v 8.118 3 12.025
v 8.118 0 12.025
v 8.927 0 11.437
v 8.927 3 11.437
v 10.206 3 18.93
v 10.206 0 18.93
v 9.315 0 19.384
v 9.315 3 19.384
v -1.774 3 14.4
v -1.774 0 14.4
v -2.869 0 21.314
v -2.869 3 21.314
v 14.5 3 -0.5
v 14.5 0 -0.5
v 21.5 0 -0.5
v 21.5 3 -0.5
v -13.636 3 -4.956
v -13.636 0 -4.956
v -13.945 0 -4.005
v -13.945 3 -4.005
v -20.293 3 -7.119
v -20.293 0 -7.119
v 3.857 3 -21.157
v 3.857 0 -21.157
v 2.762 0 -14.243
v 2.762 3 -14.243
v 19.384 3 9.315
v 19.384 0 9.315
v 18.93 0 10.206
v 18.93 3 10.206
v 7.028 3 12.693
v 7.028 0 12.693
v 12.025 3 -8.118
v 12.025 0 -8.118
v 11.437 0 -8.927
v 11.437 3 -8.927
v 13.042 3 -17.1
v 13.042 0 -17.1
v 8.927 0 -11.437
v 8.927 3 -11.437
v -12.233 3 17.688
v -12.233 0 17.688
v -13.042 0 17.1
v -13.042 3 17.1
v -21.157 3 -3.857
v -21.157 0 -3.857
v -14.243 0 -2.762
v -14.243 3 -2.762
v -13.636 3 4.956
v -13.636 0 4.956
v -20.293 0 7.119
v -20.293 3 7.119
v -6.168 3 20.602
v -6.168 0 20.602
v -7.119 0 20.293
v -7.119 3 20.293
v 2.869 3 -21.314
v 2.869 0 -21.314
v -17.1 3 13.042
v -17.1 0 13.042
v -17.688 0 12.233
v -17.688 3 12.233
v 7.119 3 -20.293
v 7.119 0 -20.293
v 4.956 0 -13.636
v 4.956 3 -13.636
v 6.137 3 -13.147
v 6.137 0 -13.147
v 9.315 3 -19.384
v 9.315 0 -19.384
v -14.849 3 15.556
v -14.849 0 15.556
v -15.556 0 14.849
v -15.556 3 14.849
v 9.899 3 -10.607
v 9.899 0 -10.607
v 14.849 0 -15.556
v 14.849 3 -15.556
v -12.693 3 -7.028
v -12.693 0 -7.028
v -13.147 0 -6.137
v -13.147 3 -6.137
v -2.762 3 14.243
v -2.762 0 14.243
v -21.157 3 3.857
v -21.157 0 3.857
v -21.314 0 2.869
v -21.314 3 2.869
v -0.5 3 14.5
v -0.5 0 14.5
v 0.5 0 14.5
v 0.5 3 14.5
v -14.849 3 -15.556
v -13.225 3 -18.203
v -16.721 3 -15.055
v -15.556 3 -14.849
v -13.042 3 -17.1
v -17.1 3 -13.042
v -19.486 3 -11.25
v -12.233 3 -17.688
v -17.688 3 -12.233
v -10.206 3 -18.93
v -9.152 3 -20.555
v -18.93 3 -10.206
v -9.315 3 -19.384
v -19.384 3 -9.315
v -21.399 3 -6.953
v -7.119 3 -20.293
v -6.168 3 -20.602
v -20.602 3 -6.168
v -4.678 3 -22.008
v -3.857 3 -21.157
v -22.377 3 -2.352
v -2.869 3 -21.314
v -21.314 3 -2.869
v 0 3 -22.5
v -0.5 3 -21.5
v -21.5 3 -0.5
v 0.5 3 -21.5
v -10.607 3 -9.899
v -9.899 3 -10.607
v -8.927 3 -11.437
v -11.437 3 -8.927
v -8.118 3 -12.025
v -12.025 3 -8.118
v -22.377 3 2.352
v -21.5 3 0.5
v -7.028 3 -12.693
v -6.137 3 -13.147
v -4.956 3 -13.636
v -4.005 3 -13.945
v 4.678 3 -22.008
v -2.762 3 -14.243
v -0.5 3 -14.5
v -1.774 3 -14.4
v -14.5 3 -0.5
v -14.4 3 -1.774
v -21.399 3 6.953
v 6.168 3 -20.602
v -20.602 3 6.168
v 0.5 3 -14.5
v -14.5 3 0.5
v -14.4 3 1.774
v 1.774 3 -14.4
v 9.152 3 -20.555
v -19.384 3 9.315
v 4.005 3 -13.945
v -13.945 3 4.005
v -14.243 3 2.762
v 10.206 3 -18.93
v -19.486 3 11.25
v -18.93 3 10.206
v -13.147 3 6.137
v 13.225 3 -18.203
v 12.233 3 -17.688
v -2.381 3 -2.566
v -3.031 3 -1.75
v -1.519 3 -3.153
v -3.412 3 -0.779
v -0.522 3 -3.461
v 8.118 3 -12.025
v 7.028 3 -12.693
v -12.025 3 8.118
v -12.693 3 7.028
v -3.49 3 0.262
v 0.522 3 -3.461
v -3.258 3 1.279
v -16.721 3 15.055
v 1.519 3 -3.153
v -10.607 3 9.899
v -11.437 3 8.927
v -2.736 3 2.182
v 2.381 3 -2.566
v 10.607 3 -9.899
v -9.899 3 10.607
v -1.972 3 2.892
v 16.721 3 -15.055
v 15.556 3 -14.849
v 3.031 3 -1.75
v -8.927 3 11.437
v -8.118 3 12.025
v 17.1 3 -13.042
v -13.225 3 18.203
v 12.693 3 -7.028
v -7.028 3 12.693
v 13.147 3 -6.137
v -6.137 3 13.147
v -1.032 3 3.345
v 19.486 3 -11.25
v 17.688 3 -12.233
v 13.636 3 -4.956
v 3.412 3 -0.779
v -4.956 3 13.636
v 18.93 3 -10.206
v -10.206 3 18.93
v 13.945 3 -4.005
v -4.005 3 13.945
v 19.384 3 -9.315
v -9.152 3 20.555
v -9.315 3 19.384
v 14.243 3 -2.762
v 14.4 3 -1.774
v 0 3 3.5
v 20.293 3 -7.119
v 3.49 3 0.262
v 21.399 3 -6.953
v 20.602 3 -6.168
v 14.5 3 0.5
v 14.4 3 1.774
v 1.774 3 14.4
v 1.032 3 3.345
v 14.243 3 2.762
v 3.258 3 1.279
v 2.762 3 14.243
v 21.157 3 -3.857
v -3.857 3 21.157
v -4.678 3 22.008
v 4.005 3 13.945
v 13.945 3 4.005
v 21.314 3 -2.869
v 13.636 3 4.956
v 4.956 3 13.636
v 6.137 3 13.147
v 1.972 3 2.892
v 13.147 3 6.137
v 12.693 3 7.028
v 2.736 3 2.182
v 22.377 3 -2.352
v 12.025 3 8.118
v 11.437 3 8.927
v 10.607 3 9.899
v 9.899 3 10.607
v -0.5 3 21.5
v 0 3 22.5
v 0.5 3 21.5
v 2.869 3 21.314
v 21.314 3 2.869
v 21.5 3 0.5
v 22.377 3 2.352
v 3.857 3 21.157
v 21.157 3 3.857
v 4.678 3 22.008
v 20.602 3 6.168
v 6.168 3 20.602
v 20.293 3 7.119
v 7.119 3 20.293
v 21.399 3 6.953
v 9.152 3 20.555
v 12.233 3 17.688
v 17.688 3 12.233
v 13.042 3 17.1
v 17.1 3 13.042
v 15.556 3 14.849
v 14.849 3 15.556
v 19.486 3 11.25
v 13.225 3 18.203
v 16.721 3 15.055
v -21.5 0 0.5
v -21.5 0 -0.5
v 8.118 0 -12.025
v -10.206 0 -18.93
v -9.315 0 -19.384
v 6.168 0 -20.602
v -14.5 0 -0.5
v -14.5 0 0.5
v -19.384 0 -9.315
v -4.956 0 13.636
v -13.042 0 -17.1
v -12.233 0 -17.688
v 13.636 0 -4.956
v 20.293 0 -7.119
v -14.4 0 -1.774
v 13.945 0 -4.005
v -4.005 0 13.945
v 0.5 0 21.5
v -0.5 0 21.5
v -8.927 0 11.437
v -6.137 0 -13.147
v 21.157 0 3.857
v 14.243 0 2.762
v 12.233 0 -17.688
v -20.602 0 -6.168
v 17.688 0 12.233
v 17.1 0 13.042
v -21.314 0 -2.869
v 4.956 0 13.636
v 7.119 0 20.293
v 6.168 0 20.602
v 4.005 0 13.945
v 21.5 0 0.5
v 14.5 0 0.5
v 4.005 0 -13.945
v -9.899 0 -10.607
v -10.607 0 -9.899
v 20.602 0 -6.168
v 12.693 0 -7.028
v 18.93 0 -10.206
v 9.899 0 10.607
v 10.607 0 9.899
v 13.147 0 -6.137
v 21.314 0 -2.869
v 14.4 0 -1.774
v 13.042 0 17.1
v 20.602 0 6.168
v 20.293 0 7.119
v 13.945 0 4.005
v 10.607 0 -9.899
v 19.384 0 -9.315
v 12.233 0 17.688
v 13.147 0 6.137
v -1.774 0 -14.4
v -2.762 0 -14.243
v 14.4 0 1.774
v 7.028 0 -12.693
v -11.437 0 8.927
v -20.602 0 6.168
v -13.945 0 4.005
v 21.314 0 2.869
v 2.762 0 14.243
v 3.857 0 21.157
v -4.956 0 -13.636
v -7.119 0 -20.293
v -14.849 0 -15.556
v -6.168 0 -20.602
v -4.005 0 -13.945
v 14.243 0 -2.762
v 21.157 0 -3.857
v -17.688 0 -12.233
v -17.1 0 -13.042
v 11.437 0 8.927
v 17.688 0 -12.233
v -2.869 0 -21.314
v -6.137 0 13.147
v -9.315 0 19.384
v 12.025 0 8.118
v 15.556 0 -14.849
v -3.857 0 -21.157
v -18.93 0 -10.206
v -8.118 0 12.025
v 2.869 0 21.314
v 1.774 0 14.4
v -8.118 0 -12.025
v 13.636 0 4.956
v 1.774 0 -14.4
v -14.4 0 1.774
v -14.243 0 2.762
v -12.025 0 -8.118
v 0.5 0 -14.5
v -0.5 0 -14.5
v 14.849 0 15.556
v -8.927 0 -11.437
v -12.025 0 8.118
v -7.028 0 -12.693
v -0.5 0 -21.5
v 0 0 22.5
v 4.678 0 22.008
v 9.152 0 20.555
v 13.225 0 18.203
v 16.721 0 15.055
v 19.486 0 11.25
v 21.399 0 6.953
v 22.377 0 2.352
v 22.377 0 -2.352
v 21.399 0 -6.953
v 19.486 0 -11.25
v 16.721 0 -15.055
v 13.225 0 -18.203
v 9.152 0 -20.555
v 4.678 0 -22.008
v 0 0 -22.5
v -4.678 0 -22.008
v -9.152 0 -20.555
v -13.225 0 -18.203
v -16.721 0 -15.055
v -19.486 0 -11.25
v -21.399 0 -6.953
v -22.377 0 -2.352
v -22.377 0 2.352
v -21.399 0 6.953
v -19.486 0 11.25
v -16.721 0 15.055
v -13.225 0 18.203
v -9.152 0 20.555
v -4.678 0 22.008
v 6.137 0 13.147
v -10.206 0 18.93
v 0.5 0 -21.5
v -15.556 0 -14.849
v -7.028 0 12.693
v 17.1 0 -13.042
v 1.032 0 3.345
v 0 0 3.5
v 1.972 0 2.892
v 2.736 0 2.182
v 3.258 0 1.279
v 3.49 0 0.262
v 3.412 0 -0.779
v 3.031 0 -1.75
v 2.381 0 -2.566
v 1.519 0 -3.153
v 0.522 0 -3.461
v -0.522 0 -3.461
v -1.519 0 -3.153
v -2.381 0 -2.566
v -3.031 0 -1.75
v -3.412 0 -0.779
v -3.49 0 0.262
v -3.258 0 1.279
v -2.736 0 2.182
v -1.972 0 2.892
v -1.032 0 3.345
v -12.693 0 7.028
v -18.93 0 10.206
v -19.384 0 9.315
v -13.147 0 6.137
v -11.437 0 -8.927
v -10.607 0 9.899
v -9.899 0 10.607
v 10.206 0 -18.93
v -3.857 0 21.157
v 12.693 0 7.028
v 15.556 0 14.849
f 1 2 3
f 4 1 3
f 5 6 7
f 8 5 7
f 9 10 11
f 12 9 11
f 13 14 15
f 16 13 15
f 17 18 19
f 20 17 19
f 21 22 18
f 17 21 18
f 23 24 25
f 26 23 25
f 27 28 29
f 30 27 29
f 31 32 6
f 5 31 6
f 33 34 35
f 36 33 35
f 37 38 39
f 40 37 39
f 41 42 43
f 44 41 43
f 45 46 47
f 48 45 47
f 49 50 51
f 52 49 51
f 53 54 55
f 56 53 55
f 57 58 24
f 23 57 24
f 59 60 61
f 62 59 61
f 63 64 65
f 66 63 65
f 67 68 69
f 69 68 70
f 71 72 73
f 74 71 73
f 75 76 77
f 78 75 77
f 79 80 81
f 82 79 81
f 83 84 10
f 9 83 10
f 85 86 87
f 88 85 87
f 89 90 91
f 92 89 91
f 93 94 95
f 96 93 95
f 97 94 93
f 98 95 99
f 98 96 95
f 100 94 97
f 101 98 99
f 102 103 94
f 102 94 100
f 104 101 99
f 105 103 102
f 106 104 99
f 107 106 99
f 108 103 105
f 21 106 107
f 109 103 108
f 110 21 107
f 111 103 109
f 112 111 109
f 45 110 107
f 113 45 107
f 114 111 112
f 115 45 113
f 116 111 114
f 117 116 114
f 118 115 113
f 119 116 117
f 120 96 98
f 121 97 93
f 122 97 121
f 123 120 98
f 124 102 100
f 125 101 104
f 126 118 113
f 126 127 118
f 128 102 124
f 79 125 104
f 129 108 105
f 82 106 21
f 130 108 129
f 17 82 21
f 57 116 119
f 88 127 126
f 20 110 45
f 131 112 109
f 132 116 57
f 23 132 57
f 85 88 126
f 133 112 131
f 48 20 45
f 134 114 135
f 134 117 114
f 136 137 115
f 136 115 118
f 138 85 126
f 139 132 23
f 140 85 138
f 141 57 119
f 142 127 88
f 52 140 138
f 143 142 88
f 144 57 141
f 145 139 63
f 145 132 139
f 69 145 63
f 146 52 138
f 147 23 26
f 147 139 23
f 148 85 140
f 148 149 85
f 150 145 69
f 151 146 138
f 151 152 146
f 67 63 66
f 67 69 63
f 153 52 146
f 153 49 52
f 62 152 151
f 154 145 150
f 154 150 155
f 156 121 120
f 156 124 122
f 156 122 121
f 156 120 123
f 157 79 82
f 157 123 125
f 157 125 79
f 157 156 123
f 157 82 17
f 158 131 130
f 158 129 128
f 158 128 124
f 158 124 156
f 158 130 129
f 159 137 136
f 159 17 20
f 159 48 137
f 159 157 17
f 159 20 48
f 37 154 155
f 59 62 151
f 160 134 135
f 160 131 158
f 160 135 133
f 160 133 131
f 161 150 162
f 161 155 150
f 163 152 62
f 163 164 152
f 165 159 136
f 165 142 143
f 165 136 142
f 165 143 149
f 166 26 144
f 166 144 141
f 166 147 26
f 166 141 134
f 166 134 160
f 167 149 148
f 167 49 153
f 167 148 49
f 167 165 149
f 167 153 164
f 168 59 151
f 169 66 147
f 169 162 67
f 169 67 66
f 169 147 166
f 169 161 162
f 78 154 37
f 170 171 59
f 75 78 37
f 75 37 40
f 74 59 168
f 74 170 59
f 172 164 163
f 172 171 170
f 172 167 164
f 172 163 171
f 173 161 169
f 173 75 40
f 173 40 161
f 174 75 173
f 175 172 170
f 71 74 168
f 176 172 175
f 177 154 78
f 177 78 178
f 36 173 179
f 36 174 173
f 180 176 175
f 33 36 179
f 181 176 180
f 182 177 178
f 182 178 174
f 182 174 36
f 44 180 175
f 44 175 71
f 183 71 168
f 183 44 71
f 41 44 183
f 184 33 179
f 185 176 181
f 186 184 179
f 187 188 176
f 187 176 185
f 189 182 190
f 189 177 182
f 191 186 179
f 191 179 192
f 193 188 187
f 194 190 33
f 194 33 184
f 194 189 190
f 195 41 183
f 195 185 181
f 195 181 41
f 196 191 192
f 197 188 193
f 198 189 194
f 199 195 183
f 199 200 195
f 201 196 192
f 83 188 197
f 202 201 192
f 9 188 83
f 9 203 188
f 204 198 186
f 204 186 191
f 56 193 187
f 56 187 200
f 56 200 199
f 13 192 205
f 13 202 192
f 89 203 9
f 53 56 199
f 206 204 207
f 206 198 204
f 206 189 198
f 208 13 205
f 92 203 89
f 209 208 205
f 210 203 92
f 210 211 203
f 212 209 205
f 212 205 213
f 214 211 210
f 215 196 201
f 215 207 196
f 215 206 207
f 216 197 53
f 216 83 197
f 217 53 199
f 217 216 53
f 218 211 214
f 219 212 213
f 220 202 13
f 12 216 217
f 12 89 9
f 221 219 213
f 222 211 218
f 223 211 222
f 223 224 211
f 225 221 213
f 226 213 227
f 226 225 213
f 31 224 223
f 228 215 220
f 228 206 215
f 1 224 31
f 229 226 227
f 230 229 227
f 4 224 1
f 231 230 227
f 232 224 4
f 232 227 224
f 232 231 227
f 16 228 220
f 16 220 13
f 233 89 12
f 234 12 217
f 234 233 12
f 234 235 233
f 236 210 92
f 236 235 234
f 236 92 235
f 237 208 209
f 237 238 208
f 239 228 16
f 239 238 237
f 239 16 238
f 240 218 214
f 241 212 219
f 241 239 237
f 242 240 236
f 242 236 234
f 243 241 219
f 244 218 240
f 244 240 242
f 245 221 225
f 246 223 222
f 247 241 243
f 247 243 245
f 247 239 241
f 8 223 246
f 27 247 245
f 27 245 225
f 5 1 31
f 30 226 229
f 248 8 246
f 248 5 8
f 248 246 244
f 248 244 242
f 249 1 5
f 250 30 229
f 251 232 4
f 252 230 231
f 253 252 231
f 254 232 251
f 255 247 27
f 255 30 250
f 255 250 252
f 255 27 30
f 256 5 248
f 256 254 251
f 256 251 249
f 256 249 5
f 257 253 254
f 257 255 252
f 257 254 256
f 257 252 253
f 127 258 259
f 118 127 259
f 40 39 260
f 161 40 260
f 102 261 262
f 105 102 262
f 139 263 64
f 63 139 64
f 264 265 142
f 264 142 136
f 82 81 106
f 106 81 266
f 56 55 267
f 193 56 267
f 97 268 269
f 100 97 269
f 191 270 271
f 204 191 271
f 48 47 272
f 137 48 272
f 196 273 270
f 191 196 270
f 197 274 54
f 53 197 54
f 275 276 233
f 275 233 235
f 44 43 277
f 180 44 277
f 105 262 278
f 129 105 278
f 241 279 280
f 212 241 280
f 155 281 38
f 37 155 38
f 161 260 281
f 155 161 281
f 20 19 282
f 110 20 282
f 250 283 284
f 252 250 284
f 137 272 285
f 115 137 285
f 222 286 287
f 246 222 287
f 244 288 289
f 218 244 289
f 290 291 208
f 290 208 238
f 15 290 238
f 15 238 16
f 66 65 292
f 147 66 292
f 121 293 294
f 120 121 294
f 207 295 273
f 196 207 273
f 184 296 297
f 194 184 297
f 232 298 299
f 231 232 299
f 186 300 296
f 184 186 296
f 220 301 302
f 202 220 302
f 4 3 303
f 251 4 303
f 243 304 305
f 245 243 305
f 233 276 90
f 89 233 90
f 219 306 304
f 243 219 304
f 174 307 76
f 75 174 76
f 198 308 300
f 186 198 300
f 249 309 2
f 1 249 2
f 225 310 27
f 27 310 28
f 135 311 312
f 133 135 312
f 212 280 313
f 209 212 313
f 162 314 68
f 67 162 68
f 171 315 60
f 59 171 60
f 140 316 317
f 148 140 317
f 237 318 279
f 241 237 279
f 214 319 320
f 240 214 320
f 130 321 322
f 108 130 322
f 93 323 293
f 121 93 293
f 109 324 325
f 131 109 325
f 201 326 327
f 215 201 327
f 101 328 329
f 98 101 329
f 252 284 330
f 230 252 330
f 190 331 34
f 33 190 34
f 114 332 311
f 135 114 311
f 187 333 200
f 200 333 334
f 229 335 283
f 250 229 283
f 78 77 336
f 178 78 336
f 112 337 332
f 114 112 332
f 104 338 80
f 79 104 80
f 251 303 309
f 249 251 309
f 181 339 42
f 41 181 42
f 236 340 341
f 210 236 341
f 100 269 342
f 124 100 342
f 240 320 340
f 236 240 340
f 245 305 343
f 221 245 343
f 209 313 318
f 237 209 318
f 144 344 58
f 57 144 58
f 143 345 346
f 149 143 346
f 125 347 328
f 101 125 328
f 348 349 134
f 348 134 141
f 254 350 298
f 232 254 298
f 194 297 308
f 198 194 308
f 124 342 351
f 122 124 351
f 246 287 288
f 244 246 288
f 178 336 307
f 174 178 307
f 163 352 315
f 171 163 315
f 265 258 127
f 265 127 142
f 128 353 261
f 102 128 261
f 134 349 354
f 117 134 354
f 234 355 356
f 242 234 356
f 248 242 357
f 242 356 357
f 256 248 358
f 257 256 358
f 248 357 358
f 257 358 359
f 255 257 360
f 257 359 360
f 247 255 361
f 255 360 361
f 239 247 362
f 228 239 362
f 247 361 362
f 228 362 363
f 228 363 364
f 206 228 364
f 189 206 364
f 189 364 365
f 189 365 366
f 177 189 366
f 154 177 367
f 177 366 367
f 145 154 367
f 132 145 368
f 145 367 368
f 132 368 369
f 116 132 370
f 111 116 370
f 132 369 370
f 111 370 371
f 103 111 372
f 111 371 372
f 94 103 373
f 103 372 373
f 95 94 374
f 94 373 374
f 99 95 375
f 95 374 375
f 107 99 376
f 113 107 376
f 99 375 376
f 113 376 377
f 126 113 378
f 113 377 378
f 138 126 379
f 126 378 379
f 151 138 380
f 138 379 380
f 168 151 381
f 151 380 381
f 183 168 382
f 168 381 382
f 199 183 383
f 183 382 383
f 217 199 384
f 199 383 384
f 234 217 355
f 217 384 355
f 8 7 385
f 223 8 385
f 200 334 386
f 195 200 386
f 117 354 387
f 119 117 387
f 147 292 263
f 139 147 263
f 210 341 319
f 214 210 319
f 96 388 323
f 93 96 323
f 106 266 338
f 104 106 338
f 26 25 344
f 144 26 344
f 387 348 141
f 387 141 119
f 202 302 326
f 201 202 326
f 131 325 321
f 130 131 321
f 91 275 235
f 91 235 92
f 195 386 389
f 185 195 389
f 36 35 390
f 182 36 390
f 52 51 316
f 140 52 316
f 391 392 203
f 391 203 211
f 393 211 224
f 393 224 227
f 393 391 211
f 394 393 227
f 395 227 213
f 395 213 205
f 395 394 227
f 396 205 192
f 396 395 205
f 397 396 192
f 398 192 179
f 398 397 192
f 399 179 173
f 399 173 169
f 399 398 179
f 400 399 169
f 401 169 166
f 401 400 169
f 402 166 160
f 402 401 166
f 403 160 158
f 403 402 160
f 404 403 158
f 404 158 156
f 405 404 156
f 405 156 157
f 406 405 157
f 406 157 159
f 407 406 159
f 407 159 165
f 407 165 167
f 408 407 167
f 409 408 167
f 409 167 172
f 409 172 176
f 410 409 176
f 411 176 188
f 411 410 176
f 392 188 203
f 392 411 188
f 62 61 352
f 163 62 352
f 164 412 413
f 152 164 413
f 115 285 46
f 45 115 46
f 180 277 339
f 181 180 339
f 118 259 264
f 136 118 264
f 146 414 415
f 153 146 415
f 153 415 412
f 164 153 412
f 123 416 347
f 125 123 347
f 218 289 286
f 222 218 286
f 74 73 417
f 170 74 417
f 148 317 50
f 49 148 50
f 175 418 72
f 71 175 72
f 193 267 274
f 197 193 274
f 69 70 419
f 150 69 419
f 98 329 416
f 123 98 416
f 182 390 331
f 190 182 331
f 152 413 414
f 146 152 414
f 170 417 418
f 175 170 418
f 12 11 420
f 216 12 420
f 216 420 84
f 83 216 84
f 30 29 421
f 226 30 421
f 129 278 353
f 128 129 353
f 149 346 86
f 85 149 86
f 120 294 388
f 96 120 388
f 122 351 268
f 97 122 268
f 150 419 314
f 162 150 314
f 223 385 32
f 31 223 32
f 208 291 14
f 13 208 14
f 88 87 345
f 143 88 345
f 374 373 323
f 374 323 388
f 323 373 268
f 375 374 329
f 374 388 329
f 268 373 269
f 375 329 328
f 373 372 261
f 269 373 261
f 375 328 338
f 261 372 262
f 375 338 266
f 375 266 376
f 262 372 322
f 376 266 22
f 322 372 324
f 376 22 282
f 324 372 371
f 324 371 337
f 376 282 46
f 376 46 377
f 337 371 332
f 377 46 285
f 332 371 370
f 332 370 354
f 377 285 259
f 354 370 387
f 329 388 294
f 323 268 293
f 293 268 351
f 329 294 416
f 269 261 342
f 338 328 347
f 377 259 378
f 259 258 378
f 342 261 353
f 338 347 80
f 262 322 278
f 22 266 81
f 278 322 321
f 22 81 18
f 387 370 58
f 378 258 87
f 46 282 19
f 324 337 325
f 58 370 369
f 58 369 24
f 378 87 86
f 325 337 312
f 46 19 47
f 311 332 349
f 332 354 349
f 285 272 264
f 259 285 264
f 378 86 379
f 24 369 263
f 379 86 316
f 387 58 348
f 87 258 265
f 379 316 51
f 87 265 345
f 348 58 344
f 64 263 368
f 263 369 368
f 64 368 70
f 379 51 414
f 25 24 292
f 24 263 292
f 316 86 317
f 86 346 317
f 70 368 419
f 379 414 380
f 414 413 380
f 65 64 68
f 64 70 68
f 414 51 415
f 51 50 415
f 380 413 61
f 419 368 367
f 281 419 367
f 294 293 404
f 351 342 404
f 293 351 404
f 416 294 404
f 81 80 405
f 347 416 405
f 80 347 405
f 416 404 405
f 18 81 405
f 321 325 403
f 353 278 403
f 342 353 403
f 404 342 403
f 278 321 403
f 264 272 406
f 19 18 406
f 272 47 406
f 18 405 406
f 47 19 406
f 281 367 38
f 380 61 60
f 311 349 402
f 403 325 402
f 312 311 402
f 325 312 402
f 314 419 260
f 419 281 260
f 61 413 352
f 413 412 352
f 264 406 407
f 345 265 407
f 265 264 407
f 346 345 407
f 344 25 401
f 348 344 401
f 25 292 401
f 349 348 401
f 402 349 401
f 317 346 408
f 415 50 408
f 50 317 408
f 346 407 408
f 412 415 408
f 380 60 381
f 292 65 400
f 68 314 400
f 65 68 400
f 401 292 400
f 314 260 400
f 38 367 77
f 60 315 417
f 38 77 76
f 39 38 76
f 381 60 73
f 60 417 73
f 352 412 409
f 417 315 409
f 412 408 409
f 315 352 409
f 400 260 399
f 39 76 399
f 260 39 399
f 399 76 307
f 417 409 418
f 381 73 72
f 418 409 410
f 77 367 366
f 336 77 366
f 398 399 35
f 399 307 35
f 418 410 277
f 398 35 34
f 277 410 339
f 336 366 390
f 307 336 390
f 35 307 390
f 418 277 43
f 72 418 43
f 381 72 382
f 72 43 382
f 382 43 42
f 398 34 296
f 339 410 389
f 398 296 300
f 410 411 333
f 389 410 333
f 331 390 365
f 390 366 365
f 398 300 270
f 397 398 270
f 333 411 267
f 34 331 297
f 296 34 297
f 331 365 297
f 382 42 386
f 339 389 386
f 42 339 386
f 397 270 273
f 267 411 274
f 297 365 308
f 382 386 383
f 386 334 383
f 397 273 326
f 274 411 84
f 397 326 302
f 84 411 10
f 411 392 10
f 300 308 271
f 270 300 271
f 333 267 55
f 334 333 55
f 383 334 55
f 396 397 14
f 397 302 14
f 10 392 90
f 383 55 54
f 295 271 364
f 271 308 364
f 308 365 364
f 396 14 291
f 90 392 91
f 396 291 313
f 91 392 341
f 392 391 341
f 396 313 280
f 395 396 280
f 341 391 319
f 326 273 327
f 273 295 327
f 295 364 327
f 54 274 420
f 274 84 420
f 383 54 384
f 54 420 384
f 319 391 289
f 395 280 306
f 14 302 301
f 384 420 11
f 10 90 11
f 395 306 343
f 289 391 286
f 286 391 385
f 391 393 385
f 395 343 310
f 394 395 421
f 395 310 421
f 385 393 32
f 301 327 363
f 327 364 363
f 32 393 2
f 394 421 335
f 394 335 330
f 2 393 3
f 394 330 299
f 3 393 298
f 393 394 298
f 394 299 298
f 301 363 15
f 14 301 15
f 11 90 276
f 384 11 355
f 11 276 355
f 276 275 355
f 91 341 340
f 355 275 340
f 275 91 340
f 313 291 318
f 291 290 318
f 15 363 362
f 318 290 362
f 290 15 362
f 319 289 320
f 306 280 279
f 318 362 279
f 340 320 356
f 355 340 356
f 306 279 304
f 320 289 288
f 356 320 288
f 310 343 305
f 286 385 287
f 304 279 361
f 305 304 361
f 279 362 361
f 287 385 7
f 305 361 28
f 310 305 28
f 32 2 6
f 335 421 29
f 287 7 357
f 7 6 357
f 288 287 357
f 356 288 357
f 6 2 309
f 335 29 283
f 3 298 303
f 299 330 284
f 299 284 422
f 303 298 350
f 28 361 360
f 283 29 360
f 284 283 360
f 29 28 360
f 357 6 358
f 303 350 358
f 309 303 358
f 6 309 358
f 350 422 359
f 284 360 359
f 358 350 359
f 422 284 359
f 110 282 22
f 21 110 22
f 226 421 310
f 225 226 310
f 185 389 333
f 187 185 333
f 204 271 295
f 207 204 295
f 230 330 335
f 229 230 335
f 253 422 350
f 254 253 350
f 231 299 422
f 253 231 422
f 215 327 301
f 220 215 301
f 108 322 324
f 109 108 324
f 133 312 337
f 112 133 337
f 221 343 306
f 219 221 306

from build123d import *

# Parameters (mm, degrees)
CROQUIS1_R              = 22.5
CROQUIS1_R_2            = 3.5
CROQUIS1_W              = 1
CROQUIS1_H              = 7
CROQUIS1_W_2            = 7
CROQUIS1_H_2            = 1
SALIENTE_EXTRUIR1_DEPTH = 3


with BuildPart() as part:
    # Croquis1 → Saliente-Extruir1 (new body)
    with BuildSketch(Plane(origin=(0, 0, 0), x_dir=(1, 0, 0), z_dir=(0, 1, 0))):
        with Locations(Location((0, 0, 0), (0, 0, 270))):
            Circle(CROQUIS1_R)
        with Locations(Location((0, 0, 0), (0, 0, 270))):
            Circle(CROQUIS1_R_2, mode=Mode.SUBTRACT)
        with Locations((0, 18)):
            Rectangle(CROQUIS1_W, CROQUIS1_H, mode=Mode.SUBTRACT)
        Polygon((2.869496828, 21.313516555), (3.857185169, 21.15708209), (2.762143913, 14.243263706), (1.774455573, 14.399698171), align=None, mode=Mode.SUBTRACT)
        Polygon((6.168337121, 20.602223598), (7.119393637, 20.293206603), (4.956274677, 13.635810989), (4.00521816, 13.944827983), align=None, mode=Mode.SUBTRACT)
        Polygon((9.315292482, 19.38363552), (10.206299006, 18.92964502), (7.028365508, 12.692599351), (6.137358984, 13.146589851), align=None, mode=Mode.SUBTRACT)
        Polygon((12.232874427, 17.687758005), (13.041891421, 17.099972753), (8.927394655, 11.436853792), (8.118377661, 12.024639045), align=None, mode=Mode.SUBTRACT)
        Polygon((14.849242405, 15.556349186), (15.556349186, 14.849242405), (10.606601718, 9.899494937), (9.899494937, 10.606601718), align=None, mode=Mode.SUBTRACT)
        Polygon((17.099972753, 13.041891421), (17.687758005, 12.232874427), (12.024639045, 8.118377661), (11.436853792, 8.927394655), align=None, mode=Mode.SUBTRACT)
        Polygon((18.92964502, 10.206299006), (19.38363552, 9.315292482), (13.146589851, 6.137358984), (12.692599351, 7.028365508), align=None, mode=Mode.SUBTRACT)
        Polygon((20.293206603, 7.119393637), (20.602223598, 6.168337121), (13.944827983, 4.00521816), (13.635810989, 4.956274677), align=None, mode=Mode.SUBTRACT)
        Polygon((21.15708209, 3.857185169), (21.313516555, 2.869496828), (14.399698171, 1.774455573), (14.243263706, 2.762143913), align=None, mode=Mode.SUBTRACT)
        with Locations((18, 0)):
            Rectangle(CROQUIS1_W_2, CROQUIS1_H_2, mode=Mode.SUBTRACT)
        Polygon((21.313516555, -2.869496828), (21.15708209, -3.857185169), (14.243263706, -2.762143913), (14.399698171, -1.774455573), align=None, mode=Mode.SUBTRACT)
        Polygon((20.602223598, -6.168337121), (20.293206603, -7.119393637), (13.635810989, -4.956274677), (13.944827983, -4.00521816), align=None, mode=Mode.SUBTRACT)
        Polygon((19.38363552, -9.315292482), (18.92964502, -10.206299006), (12.692599351, -7.028365508), (13.146589851, -6.137358984), align=None, mode=Mode.SUBTRACT)
        Polygon((17.687758005, -12.232874427), (17.099972753, -13.041891421), (11.436853792, -8.927394655), (12.024639045, -8.118377661), align=None, mode=Mode.SUBTRACT)
        Polygon((15.556349186, -14.849242405), (14.849242405, -15.556349186), (9.899494937, -10.606601718), (10.606601718, -9.899494937), align=None, mode=Mode.SUBTRACT)
        Polygon((13.041891421, -17.099972753), (12.232874427, -17.687758005), (8.118377661, -12.024639045), (8.927394655, -11.436853792), align=None, mode=Mode.SUBTRACT)
        Polygon((10.206299006, -18.92964502), (9.315292482, -19.38363552), (6.137358984, -13.146589851), (7.028365508, -12.692599351), align=None, mode=Mode.SUBTRACT)
        Polygon((7.119393637, -20.293206603), (6.168337121, -20.602223598), (4.00521816, -13.944827983), (4.956274677, -13.635810989), align=None, mode=Mode.SUBTRACT)
        Polygon((3.857185169, -21.15708209), (2.869496828, -21.313516555), (1.774455573, -14.399698171), (2.762143913, -14.243263706), align=None, mode=Mode.SUBTRACT)
        with Locations((0, -18)):
            Rectangle(CROQUIS1_W, CROQUIS1_H, mode=Mode.SUBTRACT)
        Polygon((-2.869496828, -21.313516555), (-3.857185169, -21.15708209), (-2.762143913, -14.243263706), (-1.774455573, -14.399698171), align=None, mode=Mode.SUBTRACT)
        Polygon((-6.168337121, -20.602223598), (-7.119393637, -20.293206603), (-4.956274677, -13.635810989), (-4.00521816, -13.944827983), align=None, mode=Mode.SUBTRACT)
        Polygon((-9.315292482, -19.38363552), (-10.206299006, -18.92964502), (-7.028365508, -12.692599351), (-6.137358984, -13.146589851), align=None, mode=Mode.SUBTRACT)
        Polygon((-12.232874427, -17.687758005), (-13.041891421, -17.099972753), (-8.927394655, -11.436853792), (-8.118377661, -12.024639045), align=None, mode=Mode.SUBTRACT)
        Polygon((-14.849242405, -15.556349186), (-15.556349186, -14.849242405), (-10.606601718, -9.899494937), (-9.899494937, -10.606601718), align=None, mode=Mode.SUBTRACT)
        Polygon((-17.099972753, -13.041891421), (-17.687758005, -12.232874427), (-12.024639045, -8.118377661), (-11.436853792, -8.927394655), align=None, mode=Mode.SUBTRACT)
        Polygon((-18.92964502, -10.206299006), (-19.38363552, -9.315292482), (-13.146589851, -6.137358984), (-12.692599351, -7.028365508), align=None, mode=Mode.SUBTRACT)
        Polygon((-20.293206603, -7.119393637), (-20.602223598, -6.168337121), (-13.944827983, -4.00521816), (-13.635810989, -4.956274677), align=None, mode=Mode.SUBTRACT)
        Polygon((-21.15708209, -3.857185169), (-21.313516555, -2.869496828), (-14.399698171, -1.774455573), (-14.243263706, -2.762143913), align=None, mode=Mode.SUBTRACT)
        with Locations((-18, 0)):
            Rectangle(CROQUIS1_W_2, CROQUIS1_H_2, mode=Mode.SUBTRACT)
        Polygon((-21.313516555, 2.869496828), (-21.15708209, 3.857185169), (-14.243263706, 2.762143913), (-14.399698171, 1.774455573), align=None, mode=Mode.SUBTRACT)
        Polygon((-20.602223598, 6.168337121), (-20.293206603, 7.119393637), (-13.635810989, 4.956274677), (-13.944827983, 4.00521816), align=None, mode=Mode.SUBTRACT)
        Polygon((-19.38363552, 9.315292482), (-18.92964502, 10.206299006), (-12.692599351, 7.028365508), (-13.146589851, 6.137358984), align=None, mode=Mode.SUBTRACT)
        Polygon((-17.687758005, 12.232874427), (-17.099972753, 13.041891421), (-11.436853792, 8.927394655), (-12.024639045, 8.118377661), align=None, mode=Mode.SUBTRACT)
        Polygon((-15.556349186, 14.849242405), (-14.849242405, 15.556349186), (-9.899494937, 10.606601718), (-10.606601718, 9.899494937), align=None, mode=Mode.SUBTRACT)
        Polygon((-13.041891421, 17.099972753), (-12.232874427, 17.687758005), (-8.118377661, 12.024639045), (-8.927394655, 11.436853792), align=None, mode=Mode.SUBTRACT)
        Polygon((-10.206299006, 18.92964502), (-9.315292482, 19.38363552), (-6.137358984, 13.146589851), (-7.028365508, 12.692599351), align=None, mode=Mode.SUBTRACT)
        Polygon((-7.119393637, 20.293206603), (-6.168337121, 20.602223598), (-4.00521816, 13.944827983), (-4.956274677, 13.635810989), align=None, mode=Mode.SUBTRACT)
        Polygon((-3.857185169, 21.15708209), (-2.869496828, 21.313516555), (-1.774455573, 14.399698171), (-2.762143913, 14.243263706), align=None, mode=Mode.SUBTRACT)
    extrude(amount=SALIENTE_EXTRUIR1_DEPTH)


solid = part.part
